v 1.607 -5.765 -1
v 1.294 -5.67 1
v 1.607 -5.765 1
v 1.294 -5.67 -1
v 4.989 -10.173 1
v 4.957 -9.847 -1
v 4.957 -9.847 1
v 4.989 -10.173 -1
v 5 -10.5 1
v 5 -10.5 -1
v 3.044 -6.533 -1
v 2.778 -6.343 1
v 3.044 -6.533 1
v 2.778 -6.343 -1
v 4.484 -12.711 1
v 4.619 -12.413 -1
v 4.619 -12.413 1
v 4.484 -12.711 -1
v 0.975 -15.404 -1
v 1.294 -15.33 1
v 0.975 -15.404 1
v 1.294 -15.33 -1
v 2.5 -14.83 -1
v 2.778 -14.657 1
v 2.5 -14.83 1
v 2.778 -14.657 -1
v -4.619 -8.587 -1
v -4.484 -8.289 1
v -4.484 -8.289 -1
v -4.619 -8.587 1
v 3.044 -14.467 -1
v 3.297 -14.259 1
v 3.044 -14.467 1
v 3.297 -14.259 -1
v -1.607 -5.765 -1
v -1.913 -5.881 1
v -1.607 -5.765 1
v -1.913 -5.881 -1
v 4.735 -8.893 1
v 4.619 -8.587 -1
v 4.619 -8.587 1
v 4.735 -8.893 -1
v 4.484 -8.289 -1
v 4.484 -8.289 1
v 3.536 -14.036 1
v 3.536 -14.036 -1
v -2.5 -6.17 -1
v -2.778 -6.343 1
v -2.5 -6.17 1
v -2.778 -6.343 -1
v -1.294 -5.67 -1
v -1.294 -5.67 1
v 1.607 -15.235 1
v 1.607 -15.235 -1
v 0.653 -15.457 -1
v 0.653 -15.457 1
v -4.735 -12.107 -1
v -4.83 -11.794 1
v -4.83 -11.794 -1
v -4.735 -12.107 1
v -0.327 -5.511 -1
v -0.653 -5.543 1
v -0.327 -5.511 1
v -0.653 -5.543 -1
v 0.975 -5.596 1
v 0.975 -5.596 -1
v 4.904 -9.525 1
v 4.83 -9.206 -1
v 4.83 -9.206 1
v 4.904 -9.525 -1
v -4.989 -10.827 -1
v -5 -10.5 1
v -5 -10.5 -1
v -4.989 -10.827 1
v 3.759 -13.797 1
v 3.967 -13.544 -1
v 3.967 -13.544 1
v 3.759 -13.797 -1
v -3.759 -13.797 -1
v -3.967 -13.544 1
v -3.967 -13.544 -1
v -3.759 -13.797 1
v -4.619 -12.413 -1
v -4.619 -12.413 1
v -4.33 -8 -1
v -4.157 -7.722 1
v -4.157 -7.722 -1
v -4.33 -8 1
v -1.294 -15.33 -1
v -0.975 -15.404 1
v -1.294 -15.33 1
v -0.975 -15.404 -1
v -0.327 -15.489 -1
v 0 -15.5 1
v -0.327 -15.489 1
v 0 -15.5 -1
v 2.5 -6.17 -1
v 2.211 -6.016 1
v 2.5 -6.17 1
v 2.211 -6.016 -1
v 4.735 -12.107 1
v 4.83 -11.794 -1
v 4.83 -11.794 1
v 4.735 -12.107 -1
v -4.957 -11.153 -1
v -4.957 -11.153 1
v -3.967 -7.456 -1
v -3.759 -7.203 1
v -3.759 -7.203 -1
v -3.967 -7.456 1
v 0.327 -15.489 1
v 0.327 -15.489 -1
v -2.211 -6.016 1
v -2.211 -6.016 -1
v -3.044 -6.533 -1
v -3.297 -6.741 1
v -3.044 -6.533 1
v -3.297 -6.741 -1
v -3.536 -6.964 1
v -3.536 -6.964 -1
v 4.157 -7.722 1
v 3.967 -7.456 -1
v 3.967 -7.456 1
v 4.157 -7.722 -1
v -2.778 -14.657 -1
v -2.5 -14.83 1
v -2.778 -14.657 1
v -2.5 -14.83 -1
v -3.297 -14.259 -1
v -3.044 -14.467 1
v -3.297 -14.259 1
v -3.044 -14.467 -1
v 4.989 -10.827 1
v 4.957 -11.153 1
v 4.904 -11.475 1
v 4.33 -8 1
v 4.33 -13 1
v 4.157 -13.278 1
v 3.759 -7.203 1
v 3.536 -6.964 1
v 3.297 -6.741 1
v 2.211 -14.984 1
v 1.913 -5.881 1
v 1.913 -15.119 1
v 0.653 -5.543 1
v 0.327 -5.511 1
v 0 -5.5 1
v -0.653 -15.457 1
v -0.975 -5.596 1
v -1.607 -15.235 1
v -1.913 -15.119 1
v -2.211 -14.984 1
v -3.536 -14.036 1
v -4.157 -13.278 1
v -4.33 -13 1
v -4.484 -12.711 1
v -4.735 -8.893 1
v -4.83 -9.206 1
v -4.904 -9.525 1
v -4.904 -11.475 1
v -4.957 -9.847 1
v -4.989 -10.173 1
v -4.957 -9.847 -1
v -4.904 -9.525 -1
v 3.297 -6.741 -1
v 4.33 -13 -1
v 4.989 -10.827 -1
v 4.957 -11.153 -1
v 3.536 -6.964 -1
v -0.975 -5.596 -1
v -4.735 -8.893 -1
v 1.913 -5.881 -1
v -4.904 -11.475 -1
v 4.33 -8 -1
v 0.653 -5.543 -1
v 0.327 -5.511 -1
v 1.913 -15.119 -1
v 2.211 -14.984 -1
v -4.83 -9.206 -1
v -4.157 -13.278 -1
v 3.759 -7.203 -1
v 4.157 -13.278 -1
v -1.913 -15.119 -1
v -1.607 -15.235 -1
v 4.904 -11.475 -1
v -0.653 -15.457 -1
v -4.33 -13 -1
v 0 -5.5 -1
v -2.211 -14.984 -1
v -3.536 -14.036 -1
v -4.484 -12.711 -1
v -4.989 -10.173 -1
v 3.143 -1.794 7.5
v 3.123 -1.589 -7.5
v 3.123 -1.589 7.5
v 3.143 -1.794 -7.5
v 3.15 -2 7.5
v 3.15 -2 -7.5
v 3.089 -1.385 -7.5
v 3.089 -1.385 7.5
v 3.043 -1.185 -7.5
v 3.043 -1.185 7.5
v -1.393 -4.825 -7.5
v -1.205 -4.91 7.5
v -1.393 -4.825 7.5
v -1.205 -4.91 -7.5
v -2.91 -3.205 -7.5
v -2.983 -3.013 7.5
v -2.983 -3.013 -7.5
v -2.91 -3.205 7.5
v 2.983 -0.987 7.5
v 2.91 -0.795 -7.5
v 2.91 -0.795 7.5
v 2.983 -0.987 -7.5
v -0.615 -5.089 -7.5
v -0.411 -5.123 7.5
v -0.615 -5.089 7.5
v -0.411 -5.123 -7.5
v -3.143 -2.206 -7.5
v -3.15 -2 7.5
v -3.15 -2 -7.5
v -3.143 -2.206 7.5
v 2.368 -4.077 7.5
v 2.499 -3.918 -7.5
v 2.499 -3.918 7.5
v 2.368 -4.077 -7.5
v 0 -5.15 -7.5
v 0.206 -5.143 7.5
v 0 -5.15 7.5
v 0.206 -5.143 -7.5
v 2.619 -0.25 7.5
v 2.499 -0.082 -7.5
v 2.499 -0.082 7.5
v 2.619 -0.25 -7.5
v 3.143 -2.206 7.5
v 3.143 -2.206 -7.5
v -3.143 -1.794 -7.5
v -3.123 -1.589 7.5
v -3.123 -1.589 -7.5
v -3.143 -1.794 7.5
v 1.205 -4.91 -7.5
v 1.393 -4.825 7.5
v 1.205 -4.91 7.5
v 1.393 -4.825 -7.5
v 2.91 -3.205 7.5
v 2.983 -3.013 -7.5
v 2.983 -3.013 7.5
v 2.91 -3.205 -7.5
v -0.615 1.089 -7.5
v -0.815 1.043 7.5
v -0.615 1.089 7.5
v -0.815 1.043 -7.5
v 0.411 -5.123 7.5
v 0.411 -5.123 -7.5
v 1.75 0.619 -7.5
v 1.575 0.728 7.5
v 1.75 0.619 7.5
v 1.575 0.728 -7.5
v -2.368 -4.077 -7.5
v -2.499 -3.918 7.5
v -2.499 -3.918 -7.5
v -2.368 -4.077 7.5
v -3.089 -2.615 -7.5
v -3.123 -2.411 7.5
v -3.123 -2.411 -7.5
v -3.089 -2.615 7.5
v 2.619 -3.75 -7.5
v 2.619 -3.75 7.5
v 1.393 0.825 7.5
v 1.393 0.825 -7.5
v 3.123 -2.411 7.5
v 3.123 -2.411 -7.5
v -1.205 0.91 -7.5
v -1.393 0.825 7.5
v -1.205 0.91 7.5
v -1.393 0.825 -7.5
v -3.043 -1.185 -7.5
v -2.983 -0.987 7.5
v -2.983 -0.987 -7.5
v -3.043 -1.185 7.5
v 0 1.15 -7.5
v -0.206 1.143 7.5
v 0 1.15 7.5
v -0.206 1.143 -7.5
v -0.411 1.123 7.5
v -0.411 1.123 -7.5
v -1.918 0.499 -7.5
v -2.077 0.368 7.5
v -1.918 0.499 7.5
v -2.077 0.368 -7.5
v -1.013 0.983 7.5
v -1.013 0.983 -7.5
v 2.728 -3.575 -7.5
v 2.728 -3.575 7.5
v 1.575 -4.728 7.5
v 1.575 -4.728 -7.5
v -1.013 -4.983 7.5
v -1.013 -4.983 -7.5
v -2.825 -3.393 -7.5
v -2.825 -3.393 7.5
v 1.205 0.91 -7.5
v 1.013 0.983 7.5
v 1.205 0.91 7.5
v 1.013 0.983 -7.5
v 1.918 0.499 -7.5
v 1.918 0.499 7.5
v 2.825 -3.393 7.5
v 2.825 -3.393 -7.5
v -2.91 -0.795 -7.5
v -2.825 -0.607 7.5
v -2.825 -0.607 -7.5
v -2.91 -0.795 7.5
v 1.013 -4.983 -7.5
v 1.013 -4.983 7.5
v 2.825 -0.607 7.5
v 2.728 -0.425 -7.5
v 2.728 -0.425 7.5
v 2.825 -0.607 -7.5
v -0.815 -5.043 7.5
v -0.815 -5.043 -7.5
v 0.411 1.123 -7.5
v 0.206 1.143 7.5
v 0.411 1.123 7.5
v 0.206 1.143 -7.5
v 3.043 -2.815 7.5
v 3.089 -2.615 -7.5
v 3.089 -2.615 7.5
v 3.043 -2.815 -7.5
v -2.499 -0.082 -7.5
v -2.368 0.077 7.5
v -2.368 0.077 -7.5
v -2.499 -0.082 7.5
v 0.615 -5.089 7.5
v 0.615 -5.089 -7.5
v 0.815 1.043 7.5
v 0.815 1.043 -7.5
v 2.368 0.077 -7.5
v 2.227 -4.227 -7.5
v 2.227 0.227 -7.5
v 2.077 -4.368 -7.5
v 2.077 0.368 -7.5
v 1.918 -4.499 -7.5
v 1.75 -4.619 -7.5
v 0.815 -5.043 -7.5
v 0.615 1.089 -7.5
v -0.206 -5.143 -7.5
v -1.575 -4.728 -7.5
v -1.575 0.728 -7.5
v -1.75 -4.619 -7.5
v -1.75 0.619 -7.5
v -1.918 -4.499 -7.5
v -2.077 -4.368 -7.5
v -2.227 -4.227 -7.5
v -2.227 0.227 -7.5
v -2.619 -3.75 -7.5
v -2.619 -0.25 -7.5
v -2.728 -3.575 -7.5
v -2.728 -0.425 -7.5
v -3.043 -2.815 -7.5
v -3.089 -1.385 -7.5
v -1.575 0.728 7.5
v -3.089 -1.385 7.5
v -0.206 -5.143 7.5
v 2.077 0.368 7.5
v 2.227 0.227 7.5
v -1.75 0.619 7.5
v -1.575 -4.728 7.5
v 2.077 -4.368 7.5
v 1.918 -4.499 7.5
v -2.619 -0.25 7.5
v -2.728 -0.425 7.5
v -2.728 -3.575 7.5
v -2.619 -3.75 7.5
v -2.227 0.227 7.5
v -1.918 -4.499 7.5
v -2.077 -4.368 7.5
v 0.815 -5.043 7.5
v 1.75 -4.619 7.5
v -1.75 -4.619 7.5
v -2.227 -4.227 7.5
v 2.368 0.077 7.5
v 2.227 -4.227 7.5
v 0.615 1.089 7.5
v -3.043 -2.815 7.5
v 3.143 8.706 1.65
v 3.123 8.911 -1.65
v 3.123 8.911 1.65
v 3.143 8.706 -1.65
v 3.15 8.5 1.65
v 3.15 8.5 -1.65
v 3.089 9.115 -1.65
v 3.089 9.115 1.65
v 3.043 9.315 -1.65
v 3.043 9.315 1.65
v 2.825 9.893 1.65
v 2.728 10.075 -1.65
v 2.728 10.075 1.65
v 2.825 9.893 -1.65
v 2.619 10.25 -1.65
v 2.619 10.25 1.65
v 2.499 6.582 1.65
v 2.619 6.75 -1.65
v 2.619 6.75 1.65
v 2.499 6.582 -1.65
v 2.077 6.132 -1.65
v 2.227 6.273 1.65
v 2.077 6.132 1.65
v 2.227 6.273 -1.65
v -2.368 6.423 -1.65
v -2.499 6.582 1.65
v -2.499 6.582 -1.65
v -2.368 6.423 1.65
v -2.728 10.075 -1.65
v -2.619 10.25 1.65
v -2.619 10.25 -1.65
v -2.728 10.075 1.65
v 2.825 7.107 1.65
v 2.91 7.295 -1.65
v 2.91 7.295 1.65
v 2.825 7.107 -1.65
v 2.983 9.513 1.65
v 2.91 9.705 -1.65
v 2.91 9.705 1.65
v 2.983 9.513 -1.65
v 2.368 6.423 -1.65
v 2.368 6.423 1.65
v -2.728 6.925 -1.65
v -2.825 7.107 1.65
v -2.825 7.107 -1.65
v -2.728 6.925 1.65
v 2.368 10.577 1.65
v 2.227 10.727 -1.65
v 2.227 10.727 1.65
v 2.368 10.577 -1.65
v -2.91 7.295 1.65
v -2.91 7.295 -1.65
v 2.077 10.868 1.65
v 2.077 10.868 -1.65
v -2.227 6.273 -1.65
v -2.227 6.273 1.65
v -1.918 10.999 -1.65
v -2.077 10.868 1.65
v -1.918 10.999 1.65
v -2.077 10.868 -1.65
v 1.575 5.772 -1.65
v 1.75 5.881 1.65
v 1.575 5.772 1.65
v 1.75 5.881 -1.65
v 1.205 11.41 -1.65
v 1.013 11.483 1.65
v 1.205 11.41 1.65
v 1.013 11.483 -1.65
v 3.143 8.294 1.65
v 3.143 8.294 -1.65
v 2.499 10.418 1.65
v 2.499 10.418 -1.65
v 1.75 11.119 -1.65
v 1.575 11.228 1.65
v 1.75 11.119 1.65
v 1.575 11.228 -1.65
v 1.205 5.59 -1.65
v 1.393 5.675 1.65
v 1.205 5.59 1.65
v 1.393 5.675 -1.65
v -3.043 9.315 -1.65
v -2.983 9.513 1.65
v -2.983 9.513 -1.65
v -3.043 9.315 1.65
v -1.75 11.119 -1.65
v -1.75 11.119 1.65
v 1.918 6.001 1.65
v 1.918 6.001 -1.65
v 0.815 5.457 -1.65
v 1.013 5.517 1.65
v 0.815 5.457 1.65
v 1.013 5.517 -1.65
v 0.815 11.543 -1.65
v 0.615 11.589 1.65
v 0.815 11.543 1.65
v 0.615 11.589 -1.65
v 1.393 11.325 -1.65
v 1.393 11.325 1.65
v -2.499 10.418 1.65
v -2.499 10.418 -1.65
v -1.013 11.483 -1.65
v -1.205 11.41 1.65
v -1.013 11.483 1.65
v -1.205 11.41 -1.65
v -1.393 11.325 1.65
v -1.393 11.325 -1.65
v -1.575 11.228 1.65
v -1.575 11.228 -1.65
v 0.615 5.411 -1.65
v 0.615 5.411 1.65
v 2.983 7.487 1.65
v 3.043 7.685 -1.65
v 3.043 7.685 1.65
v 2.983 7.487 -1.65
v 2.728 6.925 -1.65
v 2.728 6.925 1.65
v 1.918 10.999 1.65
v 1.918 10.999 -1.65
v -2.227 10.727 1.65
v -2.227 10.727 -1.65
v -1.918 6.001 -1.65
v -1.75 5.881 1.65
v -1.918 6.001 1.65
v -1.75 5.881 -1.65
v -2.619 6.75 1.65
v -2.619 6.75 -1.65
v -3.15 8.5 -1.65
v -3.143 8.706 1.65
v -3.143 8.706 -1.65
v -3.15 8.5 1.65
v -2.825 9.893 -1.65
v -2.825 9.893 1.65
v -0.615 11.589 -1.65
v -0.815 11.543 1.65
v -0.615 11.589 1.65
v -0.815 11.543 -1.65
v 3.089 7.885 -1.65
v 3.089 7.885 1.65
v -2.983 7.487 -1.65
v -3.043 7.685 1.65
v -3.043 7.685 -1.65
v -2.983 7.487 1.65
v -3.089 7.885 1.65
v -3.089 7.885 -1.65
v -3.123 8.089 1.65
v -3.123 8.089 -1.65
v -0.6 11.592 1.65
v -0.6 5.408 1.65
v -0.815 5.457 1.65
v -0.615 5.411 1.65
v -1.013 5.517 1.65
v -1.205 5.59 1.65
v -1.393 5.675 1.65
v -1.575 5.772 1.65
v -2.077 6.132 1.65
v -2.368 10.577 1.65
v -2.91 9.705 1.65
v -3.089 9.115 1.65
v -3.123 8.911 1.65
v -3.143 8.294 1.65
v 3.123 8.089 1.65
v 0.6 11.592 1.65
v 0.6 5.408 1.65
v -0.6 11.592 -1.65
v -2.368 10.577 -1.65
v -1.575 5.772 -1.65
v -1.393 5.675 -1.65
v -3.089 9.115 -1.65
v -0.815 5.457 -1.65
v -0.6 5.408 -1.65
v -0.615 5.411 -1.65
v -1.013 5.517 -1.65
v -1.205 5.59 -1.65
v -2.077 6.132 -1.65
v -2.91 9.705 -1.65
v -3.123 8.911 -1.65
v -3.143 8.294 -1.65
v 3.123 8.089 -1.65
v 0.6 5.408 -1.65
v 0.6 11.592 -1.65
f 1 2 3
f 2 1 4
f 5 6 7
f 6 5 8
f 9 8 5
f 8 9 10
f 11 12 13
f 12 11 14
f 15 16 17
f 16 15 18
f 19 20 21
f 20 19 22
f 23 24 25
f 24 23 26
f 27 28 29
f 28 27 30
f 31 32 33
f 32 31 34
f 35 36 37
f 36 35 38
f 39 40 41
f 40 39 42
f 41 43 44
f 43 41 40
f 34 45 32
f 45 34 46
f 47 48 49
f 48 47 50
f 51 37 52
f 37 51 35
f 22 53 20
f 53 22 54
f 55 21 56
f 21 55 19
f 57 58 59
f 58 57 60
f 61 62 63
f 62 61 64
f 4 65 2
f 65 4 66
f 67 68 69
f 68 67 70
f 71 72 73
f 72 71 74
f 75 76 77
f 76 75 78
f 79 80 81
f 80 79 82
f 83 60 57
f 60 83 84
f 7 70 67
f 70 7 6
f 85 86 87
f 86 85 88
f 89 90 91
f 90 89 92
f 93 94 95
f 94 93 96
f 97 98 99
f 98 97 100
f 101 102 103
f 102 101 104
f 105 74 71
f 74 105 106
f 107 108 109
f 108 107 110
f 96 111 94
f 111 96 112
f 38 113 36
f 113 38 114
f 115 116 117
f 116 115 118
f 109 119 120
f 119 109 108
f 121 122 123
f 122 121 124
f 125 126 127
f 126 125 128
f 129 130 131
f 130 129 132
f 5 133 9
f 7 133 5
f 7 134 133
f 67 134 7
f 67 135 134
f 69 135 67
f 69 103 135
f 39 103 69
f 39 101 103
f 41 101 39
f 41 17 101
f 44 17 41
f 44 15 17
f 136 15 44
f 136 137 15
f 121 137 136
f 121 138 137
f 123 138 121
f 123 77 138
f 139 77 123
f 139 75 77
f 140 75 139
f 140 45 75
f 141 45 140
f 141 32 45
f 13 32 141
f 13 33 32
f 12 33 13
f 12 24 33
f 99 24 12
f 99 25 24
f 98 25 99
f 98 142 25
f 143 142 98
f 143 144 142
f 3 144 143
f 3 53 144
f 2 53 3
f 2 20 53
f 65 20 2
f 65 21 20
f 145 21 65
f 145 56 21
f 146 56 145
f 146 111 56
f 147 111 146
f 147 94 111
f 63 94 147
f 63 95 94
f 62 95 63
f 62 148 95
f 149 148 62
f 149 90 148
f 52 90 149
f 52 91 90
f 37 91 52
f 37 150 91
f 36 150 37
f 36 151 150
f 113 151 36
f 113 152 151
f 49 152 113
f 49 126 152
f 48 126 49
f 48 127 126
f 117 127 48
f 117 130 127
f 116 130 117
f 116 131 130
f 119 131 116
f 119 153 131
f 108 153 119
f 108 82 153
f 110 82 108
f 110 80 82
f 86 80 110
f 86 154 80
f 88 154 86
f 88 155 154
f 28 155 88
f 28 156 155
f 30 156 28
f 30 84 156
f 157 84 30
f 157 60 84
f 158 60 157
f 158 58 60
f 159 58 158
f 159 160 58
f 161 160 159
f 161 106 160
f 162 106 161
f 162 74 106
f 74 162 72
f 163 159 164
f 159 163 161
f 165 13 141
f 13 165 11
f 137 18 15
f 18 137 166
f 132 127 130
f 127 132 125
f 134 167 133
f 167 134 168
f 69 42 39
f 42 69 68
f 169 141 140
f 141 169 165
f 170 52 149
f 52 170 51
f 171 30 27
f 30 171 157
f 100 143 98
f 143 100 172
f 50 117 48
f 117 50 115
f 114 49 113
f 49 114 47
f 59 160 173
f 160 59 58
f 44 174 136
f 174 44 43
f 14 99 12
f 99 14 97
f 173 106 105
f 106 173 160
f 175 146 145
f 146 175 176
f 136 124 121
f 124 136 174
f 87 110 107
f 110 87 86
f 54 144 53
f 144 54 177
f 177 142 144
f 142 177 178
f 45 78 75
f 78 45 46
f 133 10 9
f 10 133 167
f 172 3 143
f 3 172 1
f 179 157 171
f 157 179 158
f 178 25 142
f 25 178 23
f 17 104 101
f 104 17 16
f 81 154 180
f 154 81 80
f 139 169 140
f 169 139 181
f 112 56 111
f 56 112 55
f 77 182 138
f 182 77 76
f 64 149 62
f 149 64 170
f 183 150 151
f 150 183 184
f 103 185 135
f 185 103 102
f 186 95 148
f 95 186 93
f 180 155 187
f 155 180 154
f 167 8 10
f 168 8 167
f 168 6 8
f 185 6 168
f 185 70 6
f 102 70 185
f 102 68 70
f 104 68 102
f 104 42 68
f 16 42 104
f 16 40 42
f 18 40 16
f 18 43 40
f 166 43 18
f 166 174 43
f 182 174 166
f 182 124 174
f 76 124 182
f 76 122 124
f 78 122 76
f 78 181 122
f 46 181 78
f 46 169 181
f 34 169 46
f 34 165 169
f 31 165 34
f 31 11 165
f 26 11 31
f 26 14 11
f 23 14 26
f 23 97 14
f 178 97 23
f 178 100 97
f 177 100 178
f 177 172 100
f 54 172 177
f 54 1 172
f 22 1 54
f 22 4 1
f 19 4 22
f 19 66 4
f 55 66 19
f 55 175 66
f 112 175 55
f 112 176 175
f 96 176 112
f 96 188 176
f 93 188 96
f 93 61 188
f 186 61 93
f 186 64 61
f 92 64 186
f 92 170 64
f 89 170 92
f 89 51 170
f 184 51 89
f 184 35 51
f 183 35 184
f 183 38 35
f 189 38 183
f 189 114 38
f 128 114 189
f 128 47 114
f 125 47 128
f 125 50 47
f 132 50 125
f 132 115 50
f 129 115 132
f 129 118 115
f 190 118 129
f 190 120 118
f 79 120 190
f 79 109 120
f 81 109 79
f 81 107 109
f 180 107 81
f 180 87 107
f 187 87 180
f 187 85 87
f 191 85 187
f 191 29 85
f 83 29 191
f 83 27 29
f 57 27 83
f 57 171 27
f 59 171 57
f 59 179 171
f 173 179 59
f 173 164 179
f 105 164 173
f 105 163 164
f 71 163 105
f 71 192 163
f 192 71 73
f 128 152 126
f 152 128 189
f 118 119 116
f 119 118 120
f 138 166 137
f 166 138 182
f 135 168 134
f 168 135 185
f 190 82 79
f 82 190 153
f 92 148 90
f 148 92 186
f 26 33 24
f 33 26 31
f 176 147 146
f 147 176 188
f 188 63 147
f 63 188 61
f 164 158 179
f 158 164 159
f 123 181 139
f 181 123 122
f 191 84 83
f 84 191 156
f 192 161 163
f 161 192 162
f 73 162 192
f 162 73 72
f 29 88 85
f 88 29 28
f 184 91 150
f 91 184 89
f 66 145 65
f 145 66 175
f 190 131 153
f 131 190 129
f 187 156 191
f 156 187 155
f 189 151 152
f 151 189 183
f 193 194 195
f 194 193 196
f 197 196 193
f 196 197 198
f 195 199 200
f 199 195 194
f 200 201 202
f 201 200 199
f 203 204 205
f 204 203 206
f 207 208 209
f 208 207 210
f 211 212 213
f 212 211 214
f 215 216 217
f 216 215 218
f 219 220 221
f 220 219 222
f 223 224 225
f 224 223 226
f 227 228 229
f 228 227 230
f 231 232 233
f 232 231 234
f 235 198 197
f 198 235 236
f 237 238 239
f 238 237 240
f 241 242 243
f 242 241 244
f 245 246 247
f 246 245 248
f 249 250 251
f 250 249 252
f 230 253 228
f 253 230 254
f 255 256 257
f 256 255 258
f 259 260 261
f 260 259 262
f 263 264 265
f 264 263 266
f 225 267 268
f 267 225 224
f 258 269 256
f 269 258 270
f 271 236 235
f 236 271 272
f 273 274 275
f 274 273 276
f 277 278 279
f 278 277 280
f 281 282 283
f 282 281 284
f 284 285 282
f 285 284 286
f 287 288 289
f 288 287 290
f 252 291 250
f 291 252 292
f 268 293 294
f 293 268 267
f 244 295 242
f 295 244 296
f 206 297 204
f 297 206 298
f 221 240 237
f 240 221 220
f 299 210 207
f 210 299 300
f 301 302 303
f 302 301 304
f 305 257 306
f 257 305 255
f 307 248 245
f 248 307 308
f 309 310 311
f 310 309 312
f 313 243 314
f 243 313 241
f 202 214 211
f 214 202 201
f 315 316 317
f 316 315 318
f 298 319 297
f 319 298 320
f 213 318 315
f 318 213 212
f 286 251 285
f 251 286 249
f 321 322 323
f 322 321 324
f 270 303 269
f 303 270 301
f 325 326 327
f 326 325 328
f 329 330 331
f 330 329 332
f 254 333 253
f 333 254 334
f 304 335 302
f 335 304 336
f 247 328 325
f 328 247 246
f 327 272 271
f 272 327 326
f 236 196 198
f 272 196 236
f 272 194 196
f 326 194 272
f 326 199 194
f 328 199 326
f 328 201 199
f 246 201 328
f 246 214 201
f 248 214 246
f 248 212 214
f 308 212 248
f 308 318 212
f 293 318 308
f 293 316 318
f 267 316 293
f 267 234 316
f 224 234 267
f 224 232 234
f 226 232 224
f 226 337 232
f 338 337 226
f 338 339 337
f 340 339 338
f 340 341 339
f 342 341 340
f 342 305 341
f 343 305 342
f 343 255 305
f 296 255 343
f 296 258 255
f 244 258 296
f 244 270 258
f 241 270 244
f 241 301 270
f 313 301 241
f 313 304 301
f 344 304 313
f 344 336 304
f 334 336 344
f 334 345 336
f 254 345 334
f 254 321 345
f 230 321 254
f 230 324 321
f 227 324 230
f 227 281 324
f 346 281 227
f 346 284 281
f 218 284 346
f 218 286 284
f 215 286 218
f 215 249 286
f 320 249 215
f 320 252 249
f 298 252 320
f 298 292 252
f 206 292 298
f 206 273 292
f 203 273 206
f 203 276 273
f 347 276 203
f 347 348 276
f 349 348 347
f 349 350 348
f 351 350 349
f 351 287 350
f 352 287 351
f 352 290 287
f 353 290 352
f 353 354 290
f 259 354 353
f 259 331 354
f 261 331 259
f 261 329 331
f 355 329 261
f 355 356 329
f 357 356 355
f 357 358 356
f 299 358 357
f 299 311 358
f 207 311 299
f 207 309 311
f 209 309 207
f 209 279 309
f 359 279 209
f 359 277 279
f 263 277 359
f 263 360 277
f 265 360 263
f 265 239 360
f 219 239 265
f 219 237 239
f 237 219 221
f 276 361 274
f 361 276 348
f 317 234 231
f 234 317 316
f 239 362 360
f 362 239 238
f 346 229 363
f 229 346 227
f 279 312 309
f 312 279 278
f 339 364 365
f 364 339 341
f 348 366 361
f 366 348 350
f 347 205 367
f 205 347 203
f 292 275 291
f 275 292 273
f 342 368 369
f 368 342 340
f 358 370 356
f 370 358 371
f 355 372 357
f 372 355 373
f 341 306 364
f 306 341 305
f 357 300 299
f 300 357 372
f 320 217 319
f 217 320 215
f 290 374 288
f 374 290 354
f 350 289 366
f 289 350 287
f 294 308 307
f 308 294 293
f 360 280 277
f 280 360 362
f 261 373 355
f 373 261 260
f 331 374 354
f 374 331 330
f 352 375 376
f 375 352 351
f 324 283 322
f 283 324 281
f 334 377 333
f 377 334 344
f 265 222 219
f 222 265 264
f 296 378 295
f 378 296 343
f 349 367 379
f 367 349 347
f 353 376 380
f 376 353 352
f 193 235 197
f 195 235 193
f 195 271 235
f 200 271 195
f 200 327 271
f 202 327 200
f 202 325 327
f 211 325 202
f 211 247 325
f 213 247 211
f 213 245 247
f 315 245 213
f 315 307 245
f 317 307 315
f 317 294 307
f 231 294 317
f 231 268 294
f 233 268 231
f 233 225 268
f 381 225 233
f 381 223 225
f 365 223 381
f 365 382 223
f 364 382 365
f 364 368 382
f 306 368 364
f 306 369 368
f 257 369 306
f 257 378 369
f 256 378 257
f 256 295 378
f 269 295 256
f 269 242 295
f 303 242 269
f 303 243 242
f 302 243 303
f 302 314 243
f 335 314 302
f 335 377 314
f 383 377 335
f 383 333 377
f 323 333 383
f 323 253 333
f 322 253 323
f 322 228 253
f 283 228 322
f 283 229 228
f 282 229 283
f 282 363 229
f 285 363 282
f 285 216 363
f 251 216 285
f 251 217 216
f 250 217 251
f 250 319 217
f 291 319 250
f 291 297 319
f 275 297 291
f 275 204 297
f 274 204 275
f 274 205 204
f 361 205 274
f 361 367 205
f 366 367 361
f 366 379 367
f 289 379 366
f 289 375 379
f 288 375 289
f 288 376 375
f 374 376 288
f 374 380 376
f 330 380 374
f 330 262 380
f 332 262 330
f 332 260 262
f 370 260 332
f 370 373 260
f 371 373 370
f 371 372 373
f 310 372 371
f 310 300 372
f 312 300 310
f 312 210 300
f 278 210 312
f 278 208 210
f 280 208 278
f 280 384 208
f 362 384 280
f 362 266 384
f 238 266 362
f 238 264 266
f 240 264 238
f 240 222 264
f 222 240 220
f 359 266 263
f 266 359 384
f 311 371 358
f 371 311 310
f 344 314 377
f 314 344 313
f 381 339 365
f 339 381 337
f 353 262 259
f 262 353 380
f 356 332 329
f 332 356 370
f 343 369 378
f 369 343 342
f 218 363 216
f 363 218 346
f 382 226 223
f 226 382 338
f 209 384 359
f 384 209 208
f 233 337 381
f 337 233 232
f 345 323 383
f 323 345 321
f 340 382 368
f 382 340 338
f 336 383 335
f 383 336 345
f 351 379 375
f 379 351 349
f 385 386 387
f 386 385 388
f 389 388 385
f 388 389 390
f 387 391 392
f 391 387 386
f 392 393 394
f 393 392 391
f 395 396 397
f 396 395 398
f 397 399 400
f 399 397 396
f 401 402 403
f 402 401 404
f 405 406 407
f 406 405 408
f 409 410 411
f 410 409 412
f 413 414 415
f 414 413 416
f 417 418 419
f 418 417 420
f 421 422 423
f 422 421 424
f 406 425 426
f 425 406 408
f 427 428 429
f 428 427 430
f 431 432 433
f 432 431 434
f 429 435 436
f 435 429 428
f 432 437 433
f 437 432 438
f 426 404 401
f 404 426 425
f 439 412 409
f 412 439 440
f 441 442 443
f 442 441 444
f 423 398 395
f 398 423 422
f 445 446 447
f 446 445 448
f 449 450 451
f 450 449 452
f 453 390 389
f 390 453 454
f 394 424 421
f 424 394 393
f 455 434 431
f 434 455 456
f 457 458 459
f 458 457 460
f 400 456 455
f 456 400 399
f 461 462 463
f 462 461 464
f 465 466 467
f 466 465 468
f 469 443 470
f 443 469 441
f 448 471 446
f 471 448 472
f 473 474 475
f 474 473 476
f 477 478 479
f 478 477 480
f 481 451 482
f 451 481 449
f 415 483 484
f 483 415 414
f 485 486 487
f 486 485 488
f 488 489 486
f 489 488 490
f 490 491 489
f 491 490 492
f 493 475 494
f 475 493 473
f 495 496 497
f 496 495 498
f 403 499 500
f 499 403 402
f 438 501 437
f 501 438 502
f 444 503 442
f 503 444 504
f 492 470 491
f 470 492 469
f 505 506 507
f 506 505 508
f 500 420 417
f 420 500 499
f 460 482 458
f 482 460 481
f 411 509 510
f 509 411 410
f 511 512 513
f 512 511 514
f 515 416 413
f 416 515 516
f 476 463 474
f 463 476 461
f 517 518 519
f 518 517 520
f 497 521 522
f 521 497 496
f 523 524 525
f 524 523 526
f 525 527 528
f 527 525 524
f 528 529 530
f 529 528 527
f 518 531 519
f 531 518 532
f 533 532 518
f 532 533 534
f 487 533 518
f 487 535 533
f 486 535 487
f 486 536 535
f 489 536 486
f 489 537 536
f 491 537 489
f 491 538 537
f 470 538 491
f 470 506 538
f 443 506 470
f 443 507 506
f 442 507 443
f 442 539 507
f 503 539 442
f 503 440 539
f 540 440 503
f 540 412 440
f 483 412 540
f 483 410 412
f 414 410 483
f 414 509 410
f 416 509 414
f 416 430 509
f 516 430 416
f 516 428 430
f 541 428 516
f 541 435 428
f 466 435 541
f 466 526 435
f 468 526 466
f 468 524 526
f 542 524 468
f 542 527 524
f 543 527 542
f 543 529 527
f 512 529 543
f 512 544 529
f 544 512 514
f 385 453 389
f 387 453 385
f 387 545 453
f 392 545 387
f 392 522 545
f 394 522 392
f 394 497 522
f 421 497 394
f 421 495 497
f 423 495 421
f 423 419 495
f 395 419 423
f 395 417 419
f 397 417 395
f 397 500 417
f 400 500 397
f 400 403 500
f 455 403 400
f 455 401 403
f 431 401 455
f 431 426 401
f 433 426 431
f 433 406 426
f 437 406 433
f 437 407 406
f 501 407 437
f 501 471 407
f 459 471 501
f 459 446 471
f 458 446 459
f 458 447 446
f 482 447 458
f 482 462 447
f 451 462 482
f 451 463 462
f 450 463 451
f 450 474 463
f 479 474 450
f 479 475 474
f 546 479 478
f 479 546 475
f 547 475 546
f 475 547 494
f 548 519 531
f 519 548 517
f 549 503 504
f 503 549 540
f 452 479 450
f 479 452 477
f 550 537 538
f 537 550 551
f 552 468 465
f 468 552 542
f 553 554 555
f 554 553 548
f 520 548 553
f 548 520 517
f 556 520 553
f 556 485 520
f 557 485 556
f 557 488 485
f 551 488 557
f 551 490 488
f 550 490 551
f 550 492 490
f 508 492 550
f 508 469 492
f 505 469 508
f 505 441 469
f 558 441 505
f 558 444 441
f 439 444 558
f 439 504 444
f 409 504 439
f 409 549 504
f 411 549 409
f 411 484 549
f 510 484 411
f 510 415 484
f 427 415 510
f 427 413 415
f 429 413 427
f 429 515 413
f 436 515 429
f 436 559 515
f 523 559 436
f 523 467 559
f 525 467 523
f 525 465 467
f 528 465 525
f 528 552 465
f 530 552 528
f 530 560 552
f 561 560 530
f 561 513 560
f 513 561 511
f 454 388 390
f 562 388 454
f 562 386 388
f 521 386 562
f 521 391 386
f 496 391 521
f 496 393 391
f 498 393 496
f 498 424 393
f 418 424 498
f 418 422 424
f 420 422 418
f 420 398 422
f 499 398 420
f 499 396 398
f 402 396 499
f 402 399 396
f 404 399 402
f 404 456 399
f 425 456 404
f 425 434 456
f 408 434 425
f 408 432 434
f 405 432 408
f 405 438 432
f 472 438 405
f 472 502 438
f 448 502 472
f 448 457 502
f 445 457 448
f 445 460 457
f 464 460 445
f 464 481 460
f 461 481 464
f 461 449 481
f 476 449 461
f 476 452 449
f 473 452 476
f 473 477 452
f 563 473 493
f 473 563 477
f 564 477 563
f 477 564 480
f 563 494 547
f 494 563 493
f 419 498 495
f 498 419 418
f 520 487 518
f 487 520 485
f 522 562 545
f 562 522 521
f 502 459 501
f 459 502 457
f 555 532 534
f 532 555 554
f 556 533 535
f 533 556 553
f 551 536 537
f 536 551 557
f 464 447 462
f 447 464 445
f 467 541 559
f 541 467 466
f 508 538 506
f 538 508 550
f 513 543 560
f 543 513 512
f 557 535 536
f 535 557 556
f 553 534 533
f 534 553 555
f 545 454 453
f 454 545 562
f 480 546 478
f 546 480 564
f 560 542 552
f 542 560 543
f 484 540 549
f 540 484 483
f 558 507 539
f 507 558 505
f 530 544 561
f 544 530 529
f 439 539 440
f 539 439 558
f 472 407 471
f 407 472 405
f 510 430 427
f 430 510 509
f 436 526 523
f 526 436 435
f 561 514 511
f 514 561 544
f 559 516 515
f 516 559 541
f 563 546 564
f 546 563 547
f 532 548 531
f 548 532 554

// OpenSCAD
$fn=96;

bbox_x = 10.0;
bbox_y = 23.0;
bbox_z = 6.3;

head_d = 10.0;
head_t = 2.0;

shank_d = 6.3;
shank_len = 15.0;

tip_len = 6.0;
slot_w = 1.2;
slot_depth = tip_len + 0.6;

module shank_and_head() {
    union() {
        translate([0, -bbox_y/2 + head_t/2, 0])
            cylinder(h=head_t, d=head_d, center=true);
        translate([0, -bbox_y/2 + head_t + shank_len/2, 0])
            cylinder(h=shank_len, d=shank_d, center=true);
    }
}

module tip_wedge() {
    translate([0, bbox_y/2 - tip_len/2, 0])
        scale([1, 1, 0.55])
            cylinder(h=tip_len, d=shank_d, center=true);
}

module slot_cut() {
    translate([0, bbox_y/2 - slot_depth/2 + 0.2, 0])
        cube([slot_w, slot_depth, bbox_z + 2], center=true);
}

difference() {
    union() {
        shank_and_head();
        tip_wedge();
    }
    slot_cut();
}
